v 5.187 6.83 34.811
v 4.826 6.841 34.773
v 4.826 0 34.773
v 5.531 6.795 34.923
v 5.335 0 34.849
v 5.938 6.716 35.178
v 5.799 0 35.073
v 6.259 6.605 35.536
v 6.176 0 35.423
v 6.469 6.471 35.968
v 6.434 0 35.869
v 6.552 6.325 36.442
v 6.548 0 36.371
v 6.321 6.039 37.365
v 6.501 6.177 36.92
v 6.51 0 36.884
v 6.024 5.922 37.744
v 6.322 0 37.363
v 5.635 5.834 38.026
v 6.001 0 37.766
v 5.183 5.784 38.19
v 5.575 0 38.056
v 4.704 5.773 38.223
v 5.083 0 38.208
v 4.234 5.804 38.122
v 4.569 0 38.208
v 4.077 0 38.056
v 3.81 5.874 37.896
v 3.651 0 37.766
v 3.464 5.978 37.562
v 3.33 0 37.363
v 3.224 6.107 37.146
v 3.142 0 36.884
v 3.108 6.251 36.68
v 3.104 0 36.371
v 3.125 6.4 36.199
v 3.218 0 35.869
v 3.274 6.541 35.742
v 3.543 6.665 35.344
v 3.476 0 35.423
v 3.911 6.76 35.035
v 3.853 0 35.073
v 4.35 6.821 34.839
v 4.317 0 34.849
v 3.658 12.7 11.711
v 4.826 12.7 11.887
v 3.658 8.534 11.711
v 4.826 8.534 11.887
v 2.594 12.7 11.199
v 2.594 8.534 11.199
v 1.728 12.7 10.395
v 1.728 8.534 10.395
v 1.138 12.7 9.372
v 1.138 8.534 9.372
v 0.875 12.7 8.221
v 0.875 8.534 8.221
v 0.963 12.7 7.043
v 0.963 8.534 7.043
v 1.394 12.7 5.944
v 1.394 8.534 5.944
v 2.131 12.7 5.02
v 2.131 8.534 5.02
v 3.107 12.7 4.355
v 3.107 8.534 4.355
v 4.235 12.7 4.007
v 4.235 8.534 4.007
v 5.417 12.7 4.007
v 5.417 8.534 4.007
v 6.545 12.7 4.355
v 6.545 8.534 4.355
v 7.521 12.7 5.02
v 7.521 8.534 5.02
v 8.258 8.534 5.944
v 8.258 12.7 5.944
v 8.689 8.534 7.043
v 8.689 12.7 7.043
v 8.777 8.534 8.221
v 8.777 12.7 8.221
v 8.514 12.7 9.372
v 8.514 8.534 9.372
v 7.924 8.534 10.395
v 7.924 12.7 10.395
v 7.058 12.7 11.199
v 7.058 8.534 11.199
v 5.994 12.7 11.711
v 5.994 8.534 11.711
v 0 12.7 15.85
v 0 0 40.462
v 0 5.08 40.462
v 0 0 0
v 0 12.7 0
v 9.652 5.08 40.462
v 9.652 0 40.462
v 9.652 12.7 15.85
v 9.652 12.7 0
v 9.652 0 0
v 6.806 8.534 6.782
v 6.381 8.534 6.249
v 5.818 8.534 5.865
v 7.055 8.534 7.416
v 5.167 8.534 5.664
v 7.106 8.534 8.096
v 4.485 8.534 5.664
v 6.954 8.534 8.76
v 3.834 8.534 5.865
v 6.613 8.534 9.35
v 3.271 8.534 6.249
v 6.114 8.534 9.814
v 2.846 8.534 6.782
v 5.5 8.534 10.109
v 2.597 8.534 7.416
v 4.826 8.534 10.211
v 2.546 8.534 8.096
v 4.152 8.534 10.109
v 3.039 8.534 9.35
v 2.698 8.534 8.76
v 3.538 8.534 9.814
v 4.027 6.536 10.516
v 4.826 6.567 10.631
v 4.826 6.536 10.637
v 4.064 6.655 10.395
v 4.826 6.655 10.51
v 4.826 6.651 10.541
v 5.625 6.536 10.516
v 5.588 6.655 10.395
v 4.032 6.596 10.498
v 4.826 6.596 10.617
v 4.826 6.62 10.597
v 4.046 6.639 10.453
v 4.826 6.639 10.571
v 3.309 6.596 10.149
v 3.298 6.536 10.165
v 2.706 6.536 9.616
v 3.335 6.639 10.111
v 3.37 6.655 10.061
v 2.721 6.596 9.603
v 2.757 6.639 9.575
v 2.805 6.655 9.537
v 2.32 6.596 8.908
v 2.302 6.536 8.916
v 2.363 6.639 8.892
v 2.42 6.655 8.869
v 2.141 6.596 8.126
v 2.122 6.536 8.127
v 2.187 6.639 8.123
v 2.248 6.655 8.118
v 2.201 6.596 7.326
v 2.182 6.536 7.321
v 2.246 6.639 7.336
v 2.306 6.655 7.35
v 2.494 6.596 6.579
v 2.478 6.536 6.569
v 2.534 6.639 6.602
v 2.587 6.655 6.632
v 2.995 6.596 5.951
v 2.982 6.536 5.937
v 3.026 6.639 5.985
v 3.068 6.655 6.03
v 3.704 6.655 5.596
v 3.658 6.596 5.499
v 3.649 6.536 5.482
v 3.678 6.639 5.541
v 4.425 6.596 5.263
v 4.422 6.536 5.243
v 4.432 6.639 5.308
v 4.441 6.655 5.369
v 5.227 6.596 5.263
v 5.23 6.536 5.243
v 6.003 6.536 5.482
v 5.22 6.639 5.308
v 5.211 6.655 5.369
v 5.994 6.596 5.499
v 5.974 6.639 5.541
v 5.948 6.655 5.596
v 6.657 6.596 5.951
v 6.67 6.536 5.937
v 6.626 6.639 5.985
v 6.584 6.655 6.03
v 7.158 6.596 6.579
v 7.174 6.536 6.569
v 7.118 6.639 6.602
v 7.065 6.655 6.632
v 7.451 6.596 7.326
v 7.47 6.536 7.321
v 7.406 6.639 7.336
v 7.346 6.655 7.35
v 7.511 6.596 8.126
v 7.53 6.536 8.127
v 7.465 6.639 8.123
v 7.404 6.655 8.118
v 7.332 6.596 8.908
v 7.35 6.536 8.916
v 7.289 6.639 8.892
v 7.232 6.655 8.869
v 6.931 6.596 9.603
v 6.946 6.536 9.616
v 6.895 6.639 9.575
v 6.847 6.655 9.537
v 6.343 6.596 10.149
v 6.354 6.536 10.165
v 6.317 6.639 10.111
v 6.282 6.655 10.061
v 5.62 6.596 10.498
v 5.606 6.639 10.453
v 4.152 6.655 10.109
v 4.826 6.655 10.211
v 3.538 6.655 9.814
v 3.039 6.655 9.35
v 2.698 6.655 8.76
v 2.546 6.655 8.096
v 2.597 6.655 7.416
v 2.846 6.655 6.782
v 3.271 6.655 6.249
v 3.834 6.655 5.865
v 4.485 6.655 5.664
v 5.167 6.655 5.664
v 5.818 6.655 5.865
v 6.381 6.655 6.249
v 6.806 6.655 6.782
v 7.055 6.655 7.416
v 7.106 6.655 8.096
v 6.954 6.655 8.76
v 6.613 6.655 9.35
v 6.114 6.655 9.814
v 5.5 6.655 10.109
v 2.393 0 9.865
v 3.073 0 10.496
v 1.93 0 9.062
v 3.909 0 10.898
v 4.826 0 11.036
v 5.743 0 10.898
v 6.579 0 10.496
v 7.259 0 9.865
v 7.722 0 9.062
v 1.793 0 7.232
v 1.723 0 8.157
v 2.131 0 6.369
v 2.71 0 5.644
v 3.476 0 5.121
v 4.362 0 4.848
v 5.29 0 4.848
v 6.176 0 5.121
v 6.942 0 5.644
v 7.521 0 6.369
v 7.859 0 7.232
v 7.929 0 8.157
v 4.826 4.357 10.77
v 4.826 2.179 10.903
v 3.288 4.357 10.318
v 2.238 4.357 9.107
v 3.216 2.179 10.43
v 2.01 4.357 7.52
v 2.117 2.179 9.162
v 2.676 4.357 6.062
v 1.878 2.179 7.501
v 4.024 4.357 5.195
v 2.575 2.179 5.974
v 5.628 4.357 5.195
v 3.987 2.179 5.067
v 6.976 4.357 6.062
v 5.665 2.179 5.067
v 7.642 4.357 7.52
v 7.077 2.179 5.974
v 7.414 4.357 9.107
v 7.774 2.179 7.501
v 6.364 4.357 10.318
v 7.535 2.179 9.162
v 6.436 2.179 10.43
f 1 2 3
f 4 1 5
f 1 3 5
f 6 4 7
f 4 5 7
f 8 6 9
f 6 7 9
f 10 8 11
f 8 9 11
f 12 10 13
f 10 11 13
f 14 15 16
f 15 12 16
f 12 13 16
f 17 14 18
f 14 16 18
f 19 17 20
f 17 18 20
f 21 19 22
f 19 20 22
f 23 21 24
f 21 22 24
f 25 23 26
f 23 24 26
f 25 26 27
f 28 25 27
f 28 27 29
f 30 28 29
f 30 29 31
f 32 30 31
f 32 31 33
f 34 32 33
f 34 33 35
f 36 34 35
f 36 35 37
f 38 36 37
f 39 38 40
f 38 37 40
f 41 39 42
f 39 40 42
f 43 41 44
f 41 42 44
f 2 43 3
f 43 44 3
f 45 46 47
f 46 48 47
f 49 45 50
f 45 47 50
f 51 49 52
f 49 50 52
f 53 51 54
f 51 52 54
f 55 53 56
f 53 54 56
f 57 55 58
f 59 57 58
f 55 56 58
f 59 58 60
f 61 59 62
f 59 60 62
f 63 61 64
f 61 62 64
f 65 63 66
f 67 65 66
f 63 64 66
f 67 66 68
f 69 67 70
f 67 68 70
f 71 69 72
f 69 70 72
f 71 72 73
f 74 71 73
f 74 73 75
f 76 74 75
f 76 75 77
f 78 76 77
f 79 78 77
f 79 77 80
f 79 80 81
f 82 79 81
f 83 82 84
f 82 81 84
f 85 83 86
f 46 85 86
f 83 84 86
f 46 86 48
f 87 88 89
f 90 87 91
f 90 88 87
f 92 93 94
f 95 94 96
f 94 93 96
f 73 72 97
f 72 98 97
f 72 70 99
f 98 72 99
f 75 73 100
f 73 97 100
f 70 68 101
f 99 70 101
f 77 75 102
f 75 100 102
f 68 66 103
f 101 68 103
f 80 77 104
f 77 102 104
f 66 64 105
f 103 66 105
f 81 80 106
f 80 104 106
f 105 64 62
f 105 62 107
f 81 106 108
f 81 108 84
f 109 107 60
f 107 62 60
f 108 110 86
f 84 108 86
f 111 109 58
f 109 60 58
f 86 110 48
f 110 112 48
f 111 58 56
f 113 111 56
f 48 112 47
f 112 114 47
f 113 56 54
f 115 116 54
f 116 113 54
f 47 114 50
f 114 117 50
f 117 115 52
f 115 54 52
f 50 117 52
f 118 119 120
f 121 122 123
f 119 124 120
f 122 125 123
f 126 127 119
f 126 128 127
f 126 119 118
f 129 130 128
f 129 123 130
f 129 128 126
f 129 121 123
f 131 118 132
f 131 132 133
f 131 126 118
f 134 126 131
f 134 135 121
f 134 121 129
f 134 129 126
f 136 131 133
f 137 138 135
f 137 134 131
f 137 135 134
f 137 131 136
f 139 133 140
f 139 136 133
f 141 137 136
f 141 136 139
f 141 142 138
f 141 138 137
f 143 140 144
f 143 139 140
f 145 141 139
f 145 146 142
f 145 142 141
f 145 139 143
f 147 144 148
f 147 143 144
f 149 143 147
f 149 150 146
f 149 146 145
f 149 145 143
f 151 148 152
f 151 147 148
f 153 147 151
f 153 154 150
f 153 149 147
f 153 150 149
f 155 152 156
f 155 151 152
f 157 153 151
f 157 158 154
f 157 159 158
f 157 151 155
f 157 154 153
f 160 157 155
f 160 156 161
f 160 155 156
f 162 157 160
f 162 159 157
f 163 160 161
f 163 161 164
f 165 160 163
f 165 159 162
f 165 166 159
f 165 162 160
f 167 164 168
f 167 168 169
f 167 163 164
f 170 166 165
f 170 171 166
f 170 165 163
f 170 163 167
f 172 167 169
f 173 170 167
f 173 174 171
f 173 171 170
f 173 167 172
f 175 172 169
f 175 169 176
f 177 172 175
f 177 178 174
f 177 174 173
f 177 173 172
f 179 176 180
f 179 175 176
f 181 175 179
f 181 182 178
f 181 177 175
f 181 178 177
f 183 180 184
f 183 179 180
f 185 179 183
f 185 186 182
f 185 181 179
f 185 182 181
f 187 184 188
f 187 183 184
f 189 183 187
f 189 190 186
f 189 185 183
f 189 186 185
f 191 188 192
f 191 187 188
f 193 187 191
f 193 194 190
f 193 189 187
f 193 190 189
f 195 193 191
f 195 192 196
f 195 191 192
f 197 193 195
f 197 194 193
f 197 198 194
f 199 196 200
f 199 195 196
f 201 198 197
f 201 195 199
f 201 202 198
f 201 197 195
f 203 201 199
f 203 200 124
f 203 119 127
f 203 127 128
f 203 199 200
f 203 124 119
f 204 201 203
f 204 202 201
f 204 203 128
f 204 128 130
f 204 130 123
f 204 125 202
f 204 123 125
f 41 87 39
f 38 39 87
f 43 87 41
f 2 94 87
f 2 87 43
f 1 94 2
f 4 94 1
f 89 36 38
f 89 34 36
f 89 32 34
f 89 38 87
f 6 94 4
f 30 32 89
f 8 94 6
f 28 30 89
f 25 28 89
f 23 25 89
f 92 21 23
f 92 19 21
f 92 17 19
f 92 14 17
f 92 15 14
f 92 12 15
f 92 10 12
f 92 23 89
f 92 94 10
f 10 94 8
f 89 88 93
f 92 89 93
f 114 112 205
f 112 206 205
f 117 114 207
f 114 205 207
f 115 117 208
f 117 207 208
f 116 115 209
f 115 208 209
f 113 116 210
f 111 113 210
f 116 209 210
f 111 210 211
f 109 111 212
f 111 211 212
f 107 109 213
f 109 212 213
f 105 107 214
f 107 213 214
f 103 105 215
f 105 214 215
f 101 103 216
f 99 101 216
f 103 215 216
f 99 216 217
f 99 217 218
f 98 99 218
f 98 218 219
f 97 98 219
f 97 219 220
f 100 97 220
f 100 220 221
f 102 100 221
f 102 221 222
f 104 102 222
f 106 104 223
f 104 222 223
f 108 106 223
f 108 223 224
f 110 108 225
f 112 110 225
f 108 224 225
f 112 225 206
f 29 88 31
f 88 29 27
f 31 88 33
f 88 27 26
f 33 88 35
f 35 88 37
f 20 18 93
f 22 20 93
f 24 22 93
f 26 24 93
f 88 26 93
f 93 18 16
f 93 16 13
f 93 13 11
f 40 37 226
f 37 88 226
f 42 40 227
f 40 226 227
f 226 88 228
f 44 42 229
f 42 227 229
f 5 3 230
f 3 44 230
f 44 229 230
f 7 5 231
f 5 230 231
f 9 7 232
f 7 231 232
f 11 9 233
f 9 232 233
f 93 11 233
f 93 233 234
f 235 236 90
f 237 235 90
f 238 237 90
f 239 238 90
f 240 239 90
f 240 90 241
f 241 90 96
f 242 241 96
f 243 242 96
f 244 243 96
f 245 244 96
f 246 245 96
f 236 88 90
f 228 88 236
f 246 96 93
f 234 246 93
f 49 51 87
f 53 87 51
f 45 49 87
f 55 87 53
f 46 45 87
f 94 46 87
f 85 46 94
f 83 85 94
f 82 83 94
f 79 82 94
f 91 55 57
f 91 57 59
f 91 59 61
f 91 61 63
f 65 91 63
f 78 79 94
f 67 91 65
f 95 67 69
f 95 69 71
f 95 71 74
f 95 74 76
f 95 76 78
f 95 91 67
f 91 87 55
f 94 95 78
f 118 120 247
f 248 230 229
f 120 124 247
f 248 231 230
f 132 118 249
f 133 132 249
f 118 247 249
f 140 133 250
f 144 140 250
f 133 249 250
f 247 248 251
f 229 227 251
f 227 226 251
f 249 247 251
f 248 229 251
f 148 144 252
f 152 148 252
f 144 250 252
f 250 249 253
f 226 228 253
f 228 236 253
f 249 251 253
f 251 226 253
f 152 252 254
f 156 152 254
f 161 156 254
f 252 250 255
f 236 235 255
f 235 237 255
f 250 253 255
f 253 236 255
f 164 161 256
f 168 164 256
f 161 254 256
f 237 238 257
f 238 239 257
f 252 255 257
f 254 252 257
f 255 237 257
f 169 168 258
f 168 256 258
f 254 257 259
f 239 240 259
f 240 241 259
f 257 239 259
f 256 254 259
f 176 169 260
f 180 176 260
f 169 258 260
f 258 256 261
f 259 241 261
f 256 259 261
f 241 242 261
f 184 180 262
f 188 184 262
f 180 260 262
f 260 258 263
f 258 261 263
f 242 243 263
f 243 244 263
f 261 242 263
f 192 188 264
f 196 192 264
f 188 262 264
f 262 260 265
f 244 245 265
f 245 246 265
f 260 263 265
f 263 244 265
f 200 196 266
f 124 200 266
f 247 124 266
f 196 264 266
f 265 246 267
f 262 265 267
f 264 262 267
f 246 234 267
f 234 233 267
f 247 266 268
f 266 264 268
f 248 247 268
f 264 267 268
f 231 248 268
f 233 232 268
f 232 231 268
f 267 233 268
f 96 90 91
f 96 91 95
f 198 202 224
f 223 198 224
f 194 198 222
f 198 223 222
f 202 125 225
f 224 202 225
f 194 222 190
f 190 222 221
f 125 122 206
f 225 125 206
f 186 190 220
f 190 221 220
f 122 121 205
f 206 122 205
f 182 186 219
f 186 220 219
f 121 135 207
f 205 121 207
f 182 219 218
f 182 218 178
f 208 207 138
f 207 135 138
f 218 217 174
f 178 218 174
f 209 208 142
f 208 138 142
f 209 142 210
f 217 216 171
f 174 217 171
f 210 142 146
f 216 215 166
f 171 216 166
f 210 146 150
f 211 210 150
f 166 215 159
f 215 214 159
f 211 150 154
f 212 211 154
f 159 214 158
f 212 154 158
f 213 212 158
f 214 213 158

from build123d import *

# Parameters (mm, degrees)
SKETCH1_W          = 9.652
SKETCH1_H          = 40.4622
EXTRUDE1_DEPTH     = 12.7
FILLET1_R          = 0.127
CUT_EXTRUDE1_DEPTH = 10.652
SKETCH5_R          = 1.7272
CUT_EXTRUDE2_DEPTH = 13.7


with BuildPart() as part:
    # Sketch1 → Extrude1 (new body)
    with BuildSketch(Plane(origin=(0, 0, 0), x_dir=(1, 0, 0), z_dir=(0, 1, 0))):
        with Locations((4.826, -20.2311)):
            Rectangle(SKETCH1_W, SKETCH1_H)
    extrude(amount=EXTRUDE1_DEPTH)

    # Sketch3 → Cut-Revolve1 (revolve, cut)
    with BuildSketch(Plane(origin=(4.826, 0, 0), x_dir=(0, 0, -1), z_dir=(1, 0, 0))):
        Polygon((-11.8872, 12.7), (-11.8872, 8.5344), (-10.2108, 8.5344), (-10.2108, 6.6548), (-10.629274995, 6.6548), (-11.0363, 0), (-7.9248, 0), (-7.9248, 12.7), align=None)
    revolve(axis=Axis((4.826, 31.679444444, 7.9248), (0, -1, 0)), mode=Mode.SUBTRACT)

    # Fillet1
    fillet1_edges = [part.edges().sort_by_distance(p)[0] for p in [
        (4.826, 6.6548, 5.220325005),
    ]]
    fillet(fillet1_edges, radius=FILLET1_R)

    # Sketch4 → Cut-Extrude1 (cut, through all)
    with BuildSketch(Plane(origin=(9.652, 0, 0), x_dir=(0, 0, -1), z_dir=(1, 0, 0))):
        Polygon((-40.4622, 5.08), (-40.4622, 12.7), (-15.8496, 12.7), align=None)
    extrude(amount=-CUT_EXTRUDE1_DEPTH, mode=Mode.SUBTRACT)

    # Sketch5 → Cut-Extrude2 (cut, through all)
    with BuildSketch(Plane.XZ):
        with Locations(Location((4.826, 36.4998, 0), (0, 0, 270))):  # turned: the seam where the file's is
            Circle(SKETCH5_R)
    extrude(amount=-CUT_EXTRUDE2_DEPTH, mode=Mode.SUBTRACT)


solid = part.part
